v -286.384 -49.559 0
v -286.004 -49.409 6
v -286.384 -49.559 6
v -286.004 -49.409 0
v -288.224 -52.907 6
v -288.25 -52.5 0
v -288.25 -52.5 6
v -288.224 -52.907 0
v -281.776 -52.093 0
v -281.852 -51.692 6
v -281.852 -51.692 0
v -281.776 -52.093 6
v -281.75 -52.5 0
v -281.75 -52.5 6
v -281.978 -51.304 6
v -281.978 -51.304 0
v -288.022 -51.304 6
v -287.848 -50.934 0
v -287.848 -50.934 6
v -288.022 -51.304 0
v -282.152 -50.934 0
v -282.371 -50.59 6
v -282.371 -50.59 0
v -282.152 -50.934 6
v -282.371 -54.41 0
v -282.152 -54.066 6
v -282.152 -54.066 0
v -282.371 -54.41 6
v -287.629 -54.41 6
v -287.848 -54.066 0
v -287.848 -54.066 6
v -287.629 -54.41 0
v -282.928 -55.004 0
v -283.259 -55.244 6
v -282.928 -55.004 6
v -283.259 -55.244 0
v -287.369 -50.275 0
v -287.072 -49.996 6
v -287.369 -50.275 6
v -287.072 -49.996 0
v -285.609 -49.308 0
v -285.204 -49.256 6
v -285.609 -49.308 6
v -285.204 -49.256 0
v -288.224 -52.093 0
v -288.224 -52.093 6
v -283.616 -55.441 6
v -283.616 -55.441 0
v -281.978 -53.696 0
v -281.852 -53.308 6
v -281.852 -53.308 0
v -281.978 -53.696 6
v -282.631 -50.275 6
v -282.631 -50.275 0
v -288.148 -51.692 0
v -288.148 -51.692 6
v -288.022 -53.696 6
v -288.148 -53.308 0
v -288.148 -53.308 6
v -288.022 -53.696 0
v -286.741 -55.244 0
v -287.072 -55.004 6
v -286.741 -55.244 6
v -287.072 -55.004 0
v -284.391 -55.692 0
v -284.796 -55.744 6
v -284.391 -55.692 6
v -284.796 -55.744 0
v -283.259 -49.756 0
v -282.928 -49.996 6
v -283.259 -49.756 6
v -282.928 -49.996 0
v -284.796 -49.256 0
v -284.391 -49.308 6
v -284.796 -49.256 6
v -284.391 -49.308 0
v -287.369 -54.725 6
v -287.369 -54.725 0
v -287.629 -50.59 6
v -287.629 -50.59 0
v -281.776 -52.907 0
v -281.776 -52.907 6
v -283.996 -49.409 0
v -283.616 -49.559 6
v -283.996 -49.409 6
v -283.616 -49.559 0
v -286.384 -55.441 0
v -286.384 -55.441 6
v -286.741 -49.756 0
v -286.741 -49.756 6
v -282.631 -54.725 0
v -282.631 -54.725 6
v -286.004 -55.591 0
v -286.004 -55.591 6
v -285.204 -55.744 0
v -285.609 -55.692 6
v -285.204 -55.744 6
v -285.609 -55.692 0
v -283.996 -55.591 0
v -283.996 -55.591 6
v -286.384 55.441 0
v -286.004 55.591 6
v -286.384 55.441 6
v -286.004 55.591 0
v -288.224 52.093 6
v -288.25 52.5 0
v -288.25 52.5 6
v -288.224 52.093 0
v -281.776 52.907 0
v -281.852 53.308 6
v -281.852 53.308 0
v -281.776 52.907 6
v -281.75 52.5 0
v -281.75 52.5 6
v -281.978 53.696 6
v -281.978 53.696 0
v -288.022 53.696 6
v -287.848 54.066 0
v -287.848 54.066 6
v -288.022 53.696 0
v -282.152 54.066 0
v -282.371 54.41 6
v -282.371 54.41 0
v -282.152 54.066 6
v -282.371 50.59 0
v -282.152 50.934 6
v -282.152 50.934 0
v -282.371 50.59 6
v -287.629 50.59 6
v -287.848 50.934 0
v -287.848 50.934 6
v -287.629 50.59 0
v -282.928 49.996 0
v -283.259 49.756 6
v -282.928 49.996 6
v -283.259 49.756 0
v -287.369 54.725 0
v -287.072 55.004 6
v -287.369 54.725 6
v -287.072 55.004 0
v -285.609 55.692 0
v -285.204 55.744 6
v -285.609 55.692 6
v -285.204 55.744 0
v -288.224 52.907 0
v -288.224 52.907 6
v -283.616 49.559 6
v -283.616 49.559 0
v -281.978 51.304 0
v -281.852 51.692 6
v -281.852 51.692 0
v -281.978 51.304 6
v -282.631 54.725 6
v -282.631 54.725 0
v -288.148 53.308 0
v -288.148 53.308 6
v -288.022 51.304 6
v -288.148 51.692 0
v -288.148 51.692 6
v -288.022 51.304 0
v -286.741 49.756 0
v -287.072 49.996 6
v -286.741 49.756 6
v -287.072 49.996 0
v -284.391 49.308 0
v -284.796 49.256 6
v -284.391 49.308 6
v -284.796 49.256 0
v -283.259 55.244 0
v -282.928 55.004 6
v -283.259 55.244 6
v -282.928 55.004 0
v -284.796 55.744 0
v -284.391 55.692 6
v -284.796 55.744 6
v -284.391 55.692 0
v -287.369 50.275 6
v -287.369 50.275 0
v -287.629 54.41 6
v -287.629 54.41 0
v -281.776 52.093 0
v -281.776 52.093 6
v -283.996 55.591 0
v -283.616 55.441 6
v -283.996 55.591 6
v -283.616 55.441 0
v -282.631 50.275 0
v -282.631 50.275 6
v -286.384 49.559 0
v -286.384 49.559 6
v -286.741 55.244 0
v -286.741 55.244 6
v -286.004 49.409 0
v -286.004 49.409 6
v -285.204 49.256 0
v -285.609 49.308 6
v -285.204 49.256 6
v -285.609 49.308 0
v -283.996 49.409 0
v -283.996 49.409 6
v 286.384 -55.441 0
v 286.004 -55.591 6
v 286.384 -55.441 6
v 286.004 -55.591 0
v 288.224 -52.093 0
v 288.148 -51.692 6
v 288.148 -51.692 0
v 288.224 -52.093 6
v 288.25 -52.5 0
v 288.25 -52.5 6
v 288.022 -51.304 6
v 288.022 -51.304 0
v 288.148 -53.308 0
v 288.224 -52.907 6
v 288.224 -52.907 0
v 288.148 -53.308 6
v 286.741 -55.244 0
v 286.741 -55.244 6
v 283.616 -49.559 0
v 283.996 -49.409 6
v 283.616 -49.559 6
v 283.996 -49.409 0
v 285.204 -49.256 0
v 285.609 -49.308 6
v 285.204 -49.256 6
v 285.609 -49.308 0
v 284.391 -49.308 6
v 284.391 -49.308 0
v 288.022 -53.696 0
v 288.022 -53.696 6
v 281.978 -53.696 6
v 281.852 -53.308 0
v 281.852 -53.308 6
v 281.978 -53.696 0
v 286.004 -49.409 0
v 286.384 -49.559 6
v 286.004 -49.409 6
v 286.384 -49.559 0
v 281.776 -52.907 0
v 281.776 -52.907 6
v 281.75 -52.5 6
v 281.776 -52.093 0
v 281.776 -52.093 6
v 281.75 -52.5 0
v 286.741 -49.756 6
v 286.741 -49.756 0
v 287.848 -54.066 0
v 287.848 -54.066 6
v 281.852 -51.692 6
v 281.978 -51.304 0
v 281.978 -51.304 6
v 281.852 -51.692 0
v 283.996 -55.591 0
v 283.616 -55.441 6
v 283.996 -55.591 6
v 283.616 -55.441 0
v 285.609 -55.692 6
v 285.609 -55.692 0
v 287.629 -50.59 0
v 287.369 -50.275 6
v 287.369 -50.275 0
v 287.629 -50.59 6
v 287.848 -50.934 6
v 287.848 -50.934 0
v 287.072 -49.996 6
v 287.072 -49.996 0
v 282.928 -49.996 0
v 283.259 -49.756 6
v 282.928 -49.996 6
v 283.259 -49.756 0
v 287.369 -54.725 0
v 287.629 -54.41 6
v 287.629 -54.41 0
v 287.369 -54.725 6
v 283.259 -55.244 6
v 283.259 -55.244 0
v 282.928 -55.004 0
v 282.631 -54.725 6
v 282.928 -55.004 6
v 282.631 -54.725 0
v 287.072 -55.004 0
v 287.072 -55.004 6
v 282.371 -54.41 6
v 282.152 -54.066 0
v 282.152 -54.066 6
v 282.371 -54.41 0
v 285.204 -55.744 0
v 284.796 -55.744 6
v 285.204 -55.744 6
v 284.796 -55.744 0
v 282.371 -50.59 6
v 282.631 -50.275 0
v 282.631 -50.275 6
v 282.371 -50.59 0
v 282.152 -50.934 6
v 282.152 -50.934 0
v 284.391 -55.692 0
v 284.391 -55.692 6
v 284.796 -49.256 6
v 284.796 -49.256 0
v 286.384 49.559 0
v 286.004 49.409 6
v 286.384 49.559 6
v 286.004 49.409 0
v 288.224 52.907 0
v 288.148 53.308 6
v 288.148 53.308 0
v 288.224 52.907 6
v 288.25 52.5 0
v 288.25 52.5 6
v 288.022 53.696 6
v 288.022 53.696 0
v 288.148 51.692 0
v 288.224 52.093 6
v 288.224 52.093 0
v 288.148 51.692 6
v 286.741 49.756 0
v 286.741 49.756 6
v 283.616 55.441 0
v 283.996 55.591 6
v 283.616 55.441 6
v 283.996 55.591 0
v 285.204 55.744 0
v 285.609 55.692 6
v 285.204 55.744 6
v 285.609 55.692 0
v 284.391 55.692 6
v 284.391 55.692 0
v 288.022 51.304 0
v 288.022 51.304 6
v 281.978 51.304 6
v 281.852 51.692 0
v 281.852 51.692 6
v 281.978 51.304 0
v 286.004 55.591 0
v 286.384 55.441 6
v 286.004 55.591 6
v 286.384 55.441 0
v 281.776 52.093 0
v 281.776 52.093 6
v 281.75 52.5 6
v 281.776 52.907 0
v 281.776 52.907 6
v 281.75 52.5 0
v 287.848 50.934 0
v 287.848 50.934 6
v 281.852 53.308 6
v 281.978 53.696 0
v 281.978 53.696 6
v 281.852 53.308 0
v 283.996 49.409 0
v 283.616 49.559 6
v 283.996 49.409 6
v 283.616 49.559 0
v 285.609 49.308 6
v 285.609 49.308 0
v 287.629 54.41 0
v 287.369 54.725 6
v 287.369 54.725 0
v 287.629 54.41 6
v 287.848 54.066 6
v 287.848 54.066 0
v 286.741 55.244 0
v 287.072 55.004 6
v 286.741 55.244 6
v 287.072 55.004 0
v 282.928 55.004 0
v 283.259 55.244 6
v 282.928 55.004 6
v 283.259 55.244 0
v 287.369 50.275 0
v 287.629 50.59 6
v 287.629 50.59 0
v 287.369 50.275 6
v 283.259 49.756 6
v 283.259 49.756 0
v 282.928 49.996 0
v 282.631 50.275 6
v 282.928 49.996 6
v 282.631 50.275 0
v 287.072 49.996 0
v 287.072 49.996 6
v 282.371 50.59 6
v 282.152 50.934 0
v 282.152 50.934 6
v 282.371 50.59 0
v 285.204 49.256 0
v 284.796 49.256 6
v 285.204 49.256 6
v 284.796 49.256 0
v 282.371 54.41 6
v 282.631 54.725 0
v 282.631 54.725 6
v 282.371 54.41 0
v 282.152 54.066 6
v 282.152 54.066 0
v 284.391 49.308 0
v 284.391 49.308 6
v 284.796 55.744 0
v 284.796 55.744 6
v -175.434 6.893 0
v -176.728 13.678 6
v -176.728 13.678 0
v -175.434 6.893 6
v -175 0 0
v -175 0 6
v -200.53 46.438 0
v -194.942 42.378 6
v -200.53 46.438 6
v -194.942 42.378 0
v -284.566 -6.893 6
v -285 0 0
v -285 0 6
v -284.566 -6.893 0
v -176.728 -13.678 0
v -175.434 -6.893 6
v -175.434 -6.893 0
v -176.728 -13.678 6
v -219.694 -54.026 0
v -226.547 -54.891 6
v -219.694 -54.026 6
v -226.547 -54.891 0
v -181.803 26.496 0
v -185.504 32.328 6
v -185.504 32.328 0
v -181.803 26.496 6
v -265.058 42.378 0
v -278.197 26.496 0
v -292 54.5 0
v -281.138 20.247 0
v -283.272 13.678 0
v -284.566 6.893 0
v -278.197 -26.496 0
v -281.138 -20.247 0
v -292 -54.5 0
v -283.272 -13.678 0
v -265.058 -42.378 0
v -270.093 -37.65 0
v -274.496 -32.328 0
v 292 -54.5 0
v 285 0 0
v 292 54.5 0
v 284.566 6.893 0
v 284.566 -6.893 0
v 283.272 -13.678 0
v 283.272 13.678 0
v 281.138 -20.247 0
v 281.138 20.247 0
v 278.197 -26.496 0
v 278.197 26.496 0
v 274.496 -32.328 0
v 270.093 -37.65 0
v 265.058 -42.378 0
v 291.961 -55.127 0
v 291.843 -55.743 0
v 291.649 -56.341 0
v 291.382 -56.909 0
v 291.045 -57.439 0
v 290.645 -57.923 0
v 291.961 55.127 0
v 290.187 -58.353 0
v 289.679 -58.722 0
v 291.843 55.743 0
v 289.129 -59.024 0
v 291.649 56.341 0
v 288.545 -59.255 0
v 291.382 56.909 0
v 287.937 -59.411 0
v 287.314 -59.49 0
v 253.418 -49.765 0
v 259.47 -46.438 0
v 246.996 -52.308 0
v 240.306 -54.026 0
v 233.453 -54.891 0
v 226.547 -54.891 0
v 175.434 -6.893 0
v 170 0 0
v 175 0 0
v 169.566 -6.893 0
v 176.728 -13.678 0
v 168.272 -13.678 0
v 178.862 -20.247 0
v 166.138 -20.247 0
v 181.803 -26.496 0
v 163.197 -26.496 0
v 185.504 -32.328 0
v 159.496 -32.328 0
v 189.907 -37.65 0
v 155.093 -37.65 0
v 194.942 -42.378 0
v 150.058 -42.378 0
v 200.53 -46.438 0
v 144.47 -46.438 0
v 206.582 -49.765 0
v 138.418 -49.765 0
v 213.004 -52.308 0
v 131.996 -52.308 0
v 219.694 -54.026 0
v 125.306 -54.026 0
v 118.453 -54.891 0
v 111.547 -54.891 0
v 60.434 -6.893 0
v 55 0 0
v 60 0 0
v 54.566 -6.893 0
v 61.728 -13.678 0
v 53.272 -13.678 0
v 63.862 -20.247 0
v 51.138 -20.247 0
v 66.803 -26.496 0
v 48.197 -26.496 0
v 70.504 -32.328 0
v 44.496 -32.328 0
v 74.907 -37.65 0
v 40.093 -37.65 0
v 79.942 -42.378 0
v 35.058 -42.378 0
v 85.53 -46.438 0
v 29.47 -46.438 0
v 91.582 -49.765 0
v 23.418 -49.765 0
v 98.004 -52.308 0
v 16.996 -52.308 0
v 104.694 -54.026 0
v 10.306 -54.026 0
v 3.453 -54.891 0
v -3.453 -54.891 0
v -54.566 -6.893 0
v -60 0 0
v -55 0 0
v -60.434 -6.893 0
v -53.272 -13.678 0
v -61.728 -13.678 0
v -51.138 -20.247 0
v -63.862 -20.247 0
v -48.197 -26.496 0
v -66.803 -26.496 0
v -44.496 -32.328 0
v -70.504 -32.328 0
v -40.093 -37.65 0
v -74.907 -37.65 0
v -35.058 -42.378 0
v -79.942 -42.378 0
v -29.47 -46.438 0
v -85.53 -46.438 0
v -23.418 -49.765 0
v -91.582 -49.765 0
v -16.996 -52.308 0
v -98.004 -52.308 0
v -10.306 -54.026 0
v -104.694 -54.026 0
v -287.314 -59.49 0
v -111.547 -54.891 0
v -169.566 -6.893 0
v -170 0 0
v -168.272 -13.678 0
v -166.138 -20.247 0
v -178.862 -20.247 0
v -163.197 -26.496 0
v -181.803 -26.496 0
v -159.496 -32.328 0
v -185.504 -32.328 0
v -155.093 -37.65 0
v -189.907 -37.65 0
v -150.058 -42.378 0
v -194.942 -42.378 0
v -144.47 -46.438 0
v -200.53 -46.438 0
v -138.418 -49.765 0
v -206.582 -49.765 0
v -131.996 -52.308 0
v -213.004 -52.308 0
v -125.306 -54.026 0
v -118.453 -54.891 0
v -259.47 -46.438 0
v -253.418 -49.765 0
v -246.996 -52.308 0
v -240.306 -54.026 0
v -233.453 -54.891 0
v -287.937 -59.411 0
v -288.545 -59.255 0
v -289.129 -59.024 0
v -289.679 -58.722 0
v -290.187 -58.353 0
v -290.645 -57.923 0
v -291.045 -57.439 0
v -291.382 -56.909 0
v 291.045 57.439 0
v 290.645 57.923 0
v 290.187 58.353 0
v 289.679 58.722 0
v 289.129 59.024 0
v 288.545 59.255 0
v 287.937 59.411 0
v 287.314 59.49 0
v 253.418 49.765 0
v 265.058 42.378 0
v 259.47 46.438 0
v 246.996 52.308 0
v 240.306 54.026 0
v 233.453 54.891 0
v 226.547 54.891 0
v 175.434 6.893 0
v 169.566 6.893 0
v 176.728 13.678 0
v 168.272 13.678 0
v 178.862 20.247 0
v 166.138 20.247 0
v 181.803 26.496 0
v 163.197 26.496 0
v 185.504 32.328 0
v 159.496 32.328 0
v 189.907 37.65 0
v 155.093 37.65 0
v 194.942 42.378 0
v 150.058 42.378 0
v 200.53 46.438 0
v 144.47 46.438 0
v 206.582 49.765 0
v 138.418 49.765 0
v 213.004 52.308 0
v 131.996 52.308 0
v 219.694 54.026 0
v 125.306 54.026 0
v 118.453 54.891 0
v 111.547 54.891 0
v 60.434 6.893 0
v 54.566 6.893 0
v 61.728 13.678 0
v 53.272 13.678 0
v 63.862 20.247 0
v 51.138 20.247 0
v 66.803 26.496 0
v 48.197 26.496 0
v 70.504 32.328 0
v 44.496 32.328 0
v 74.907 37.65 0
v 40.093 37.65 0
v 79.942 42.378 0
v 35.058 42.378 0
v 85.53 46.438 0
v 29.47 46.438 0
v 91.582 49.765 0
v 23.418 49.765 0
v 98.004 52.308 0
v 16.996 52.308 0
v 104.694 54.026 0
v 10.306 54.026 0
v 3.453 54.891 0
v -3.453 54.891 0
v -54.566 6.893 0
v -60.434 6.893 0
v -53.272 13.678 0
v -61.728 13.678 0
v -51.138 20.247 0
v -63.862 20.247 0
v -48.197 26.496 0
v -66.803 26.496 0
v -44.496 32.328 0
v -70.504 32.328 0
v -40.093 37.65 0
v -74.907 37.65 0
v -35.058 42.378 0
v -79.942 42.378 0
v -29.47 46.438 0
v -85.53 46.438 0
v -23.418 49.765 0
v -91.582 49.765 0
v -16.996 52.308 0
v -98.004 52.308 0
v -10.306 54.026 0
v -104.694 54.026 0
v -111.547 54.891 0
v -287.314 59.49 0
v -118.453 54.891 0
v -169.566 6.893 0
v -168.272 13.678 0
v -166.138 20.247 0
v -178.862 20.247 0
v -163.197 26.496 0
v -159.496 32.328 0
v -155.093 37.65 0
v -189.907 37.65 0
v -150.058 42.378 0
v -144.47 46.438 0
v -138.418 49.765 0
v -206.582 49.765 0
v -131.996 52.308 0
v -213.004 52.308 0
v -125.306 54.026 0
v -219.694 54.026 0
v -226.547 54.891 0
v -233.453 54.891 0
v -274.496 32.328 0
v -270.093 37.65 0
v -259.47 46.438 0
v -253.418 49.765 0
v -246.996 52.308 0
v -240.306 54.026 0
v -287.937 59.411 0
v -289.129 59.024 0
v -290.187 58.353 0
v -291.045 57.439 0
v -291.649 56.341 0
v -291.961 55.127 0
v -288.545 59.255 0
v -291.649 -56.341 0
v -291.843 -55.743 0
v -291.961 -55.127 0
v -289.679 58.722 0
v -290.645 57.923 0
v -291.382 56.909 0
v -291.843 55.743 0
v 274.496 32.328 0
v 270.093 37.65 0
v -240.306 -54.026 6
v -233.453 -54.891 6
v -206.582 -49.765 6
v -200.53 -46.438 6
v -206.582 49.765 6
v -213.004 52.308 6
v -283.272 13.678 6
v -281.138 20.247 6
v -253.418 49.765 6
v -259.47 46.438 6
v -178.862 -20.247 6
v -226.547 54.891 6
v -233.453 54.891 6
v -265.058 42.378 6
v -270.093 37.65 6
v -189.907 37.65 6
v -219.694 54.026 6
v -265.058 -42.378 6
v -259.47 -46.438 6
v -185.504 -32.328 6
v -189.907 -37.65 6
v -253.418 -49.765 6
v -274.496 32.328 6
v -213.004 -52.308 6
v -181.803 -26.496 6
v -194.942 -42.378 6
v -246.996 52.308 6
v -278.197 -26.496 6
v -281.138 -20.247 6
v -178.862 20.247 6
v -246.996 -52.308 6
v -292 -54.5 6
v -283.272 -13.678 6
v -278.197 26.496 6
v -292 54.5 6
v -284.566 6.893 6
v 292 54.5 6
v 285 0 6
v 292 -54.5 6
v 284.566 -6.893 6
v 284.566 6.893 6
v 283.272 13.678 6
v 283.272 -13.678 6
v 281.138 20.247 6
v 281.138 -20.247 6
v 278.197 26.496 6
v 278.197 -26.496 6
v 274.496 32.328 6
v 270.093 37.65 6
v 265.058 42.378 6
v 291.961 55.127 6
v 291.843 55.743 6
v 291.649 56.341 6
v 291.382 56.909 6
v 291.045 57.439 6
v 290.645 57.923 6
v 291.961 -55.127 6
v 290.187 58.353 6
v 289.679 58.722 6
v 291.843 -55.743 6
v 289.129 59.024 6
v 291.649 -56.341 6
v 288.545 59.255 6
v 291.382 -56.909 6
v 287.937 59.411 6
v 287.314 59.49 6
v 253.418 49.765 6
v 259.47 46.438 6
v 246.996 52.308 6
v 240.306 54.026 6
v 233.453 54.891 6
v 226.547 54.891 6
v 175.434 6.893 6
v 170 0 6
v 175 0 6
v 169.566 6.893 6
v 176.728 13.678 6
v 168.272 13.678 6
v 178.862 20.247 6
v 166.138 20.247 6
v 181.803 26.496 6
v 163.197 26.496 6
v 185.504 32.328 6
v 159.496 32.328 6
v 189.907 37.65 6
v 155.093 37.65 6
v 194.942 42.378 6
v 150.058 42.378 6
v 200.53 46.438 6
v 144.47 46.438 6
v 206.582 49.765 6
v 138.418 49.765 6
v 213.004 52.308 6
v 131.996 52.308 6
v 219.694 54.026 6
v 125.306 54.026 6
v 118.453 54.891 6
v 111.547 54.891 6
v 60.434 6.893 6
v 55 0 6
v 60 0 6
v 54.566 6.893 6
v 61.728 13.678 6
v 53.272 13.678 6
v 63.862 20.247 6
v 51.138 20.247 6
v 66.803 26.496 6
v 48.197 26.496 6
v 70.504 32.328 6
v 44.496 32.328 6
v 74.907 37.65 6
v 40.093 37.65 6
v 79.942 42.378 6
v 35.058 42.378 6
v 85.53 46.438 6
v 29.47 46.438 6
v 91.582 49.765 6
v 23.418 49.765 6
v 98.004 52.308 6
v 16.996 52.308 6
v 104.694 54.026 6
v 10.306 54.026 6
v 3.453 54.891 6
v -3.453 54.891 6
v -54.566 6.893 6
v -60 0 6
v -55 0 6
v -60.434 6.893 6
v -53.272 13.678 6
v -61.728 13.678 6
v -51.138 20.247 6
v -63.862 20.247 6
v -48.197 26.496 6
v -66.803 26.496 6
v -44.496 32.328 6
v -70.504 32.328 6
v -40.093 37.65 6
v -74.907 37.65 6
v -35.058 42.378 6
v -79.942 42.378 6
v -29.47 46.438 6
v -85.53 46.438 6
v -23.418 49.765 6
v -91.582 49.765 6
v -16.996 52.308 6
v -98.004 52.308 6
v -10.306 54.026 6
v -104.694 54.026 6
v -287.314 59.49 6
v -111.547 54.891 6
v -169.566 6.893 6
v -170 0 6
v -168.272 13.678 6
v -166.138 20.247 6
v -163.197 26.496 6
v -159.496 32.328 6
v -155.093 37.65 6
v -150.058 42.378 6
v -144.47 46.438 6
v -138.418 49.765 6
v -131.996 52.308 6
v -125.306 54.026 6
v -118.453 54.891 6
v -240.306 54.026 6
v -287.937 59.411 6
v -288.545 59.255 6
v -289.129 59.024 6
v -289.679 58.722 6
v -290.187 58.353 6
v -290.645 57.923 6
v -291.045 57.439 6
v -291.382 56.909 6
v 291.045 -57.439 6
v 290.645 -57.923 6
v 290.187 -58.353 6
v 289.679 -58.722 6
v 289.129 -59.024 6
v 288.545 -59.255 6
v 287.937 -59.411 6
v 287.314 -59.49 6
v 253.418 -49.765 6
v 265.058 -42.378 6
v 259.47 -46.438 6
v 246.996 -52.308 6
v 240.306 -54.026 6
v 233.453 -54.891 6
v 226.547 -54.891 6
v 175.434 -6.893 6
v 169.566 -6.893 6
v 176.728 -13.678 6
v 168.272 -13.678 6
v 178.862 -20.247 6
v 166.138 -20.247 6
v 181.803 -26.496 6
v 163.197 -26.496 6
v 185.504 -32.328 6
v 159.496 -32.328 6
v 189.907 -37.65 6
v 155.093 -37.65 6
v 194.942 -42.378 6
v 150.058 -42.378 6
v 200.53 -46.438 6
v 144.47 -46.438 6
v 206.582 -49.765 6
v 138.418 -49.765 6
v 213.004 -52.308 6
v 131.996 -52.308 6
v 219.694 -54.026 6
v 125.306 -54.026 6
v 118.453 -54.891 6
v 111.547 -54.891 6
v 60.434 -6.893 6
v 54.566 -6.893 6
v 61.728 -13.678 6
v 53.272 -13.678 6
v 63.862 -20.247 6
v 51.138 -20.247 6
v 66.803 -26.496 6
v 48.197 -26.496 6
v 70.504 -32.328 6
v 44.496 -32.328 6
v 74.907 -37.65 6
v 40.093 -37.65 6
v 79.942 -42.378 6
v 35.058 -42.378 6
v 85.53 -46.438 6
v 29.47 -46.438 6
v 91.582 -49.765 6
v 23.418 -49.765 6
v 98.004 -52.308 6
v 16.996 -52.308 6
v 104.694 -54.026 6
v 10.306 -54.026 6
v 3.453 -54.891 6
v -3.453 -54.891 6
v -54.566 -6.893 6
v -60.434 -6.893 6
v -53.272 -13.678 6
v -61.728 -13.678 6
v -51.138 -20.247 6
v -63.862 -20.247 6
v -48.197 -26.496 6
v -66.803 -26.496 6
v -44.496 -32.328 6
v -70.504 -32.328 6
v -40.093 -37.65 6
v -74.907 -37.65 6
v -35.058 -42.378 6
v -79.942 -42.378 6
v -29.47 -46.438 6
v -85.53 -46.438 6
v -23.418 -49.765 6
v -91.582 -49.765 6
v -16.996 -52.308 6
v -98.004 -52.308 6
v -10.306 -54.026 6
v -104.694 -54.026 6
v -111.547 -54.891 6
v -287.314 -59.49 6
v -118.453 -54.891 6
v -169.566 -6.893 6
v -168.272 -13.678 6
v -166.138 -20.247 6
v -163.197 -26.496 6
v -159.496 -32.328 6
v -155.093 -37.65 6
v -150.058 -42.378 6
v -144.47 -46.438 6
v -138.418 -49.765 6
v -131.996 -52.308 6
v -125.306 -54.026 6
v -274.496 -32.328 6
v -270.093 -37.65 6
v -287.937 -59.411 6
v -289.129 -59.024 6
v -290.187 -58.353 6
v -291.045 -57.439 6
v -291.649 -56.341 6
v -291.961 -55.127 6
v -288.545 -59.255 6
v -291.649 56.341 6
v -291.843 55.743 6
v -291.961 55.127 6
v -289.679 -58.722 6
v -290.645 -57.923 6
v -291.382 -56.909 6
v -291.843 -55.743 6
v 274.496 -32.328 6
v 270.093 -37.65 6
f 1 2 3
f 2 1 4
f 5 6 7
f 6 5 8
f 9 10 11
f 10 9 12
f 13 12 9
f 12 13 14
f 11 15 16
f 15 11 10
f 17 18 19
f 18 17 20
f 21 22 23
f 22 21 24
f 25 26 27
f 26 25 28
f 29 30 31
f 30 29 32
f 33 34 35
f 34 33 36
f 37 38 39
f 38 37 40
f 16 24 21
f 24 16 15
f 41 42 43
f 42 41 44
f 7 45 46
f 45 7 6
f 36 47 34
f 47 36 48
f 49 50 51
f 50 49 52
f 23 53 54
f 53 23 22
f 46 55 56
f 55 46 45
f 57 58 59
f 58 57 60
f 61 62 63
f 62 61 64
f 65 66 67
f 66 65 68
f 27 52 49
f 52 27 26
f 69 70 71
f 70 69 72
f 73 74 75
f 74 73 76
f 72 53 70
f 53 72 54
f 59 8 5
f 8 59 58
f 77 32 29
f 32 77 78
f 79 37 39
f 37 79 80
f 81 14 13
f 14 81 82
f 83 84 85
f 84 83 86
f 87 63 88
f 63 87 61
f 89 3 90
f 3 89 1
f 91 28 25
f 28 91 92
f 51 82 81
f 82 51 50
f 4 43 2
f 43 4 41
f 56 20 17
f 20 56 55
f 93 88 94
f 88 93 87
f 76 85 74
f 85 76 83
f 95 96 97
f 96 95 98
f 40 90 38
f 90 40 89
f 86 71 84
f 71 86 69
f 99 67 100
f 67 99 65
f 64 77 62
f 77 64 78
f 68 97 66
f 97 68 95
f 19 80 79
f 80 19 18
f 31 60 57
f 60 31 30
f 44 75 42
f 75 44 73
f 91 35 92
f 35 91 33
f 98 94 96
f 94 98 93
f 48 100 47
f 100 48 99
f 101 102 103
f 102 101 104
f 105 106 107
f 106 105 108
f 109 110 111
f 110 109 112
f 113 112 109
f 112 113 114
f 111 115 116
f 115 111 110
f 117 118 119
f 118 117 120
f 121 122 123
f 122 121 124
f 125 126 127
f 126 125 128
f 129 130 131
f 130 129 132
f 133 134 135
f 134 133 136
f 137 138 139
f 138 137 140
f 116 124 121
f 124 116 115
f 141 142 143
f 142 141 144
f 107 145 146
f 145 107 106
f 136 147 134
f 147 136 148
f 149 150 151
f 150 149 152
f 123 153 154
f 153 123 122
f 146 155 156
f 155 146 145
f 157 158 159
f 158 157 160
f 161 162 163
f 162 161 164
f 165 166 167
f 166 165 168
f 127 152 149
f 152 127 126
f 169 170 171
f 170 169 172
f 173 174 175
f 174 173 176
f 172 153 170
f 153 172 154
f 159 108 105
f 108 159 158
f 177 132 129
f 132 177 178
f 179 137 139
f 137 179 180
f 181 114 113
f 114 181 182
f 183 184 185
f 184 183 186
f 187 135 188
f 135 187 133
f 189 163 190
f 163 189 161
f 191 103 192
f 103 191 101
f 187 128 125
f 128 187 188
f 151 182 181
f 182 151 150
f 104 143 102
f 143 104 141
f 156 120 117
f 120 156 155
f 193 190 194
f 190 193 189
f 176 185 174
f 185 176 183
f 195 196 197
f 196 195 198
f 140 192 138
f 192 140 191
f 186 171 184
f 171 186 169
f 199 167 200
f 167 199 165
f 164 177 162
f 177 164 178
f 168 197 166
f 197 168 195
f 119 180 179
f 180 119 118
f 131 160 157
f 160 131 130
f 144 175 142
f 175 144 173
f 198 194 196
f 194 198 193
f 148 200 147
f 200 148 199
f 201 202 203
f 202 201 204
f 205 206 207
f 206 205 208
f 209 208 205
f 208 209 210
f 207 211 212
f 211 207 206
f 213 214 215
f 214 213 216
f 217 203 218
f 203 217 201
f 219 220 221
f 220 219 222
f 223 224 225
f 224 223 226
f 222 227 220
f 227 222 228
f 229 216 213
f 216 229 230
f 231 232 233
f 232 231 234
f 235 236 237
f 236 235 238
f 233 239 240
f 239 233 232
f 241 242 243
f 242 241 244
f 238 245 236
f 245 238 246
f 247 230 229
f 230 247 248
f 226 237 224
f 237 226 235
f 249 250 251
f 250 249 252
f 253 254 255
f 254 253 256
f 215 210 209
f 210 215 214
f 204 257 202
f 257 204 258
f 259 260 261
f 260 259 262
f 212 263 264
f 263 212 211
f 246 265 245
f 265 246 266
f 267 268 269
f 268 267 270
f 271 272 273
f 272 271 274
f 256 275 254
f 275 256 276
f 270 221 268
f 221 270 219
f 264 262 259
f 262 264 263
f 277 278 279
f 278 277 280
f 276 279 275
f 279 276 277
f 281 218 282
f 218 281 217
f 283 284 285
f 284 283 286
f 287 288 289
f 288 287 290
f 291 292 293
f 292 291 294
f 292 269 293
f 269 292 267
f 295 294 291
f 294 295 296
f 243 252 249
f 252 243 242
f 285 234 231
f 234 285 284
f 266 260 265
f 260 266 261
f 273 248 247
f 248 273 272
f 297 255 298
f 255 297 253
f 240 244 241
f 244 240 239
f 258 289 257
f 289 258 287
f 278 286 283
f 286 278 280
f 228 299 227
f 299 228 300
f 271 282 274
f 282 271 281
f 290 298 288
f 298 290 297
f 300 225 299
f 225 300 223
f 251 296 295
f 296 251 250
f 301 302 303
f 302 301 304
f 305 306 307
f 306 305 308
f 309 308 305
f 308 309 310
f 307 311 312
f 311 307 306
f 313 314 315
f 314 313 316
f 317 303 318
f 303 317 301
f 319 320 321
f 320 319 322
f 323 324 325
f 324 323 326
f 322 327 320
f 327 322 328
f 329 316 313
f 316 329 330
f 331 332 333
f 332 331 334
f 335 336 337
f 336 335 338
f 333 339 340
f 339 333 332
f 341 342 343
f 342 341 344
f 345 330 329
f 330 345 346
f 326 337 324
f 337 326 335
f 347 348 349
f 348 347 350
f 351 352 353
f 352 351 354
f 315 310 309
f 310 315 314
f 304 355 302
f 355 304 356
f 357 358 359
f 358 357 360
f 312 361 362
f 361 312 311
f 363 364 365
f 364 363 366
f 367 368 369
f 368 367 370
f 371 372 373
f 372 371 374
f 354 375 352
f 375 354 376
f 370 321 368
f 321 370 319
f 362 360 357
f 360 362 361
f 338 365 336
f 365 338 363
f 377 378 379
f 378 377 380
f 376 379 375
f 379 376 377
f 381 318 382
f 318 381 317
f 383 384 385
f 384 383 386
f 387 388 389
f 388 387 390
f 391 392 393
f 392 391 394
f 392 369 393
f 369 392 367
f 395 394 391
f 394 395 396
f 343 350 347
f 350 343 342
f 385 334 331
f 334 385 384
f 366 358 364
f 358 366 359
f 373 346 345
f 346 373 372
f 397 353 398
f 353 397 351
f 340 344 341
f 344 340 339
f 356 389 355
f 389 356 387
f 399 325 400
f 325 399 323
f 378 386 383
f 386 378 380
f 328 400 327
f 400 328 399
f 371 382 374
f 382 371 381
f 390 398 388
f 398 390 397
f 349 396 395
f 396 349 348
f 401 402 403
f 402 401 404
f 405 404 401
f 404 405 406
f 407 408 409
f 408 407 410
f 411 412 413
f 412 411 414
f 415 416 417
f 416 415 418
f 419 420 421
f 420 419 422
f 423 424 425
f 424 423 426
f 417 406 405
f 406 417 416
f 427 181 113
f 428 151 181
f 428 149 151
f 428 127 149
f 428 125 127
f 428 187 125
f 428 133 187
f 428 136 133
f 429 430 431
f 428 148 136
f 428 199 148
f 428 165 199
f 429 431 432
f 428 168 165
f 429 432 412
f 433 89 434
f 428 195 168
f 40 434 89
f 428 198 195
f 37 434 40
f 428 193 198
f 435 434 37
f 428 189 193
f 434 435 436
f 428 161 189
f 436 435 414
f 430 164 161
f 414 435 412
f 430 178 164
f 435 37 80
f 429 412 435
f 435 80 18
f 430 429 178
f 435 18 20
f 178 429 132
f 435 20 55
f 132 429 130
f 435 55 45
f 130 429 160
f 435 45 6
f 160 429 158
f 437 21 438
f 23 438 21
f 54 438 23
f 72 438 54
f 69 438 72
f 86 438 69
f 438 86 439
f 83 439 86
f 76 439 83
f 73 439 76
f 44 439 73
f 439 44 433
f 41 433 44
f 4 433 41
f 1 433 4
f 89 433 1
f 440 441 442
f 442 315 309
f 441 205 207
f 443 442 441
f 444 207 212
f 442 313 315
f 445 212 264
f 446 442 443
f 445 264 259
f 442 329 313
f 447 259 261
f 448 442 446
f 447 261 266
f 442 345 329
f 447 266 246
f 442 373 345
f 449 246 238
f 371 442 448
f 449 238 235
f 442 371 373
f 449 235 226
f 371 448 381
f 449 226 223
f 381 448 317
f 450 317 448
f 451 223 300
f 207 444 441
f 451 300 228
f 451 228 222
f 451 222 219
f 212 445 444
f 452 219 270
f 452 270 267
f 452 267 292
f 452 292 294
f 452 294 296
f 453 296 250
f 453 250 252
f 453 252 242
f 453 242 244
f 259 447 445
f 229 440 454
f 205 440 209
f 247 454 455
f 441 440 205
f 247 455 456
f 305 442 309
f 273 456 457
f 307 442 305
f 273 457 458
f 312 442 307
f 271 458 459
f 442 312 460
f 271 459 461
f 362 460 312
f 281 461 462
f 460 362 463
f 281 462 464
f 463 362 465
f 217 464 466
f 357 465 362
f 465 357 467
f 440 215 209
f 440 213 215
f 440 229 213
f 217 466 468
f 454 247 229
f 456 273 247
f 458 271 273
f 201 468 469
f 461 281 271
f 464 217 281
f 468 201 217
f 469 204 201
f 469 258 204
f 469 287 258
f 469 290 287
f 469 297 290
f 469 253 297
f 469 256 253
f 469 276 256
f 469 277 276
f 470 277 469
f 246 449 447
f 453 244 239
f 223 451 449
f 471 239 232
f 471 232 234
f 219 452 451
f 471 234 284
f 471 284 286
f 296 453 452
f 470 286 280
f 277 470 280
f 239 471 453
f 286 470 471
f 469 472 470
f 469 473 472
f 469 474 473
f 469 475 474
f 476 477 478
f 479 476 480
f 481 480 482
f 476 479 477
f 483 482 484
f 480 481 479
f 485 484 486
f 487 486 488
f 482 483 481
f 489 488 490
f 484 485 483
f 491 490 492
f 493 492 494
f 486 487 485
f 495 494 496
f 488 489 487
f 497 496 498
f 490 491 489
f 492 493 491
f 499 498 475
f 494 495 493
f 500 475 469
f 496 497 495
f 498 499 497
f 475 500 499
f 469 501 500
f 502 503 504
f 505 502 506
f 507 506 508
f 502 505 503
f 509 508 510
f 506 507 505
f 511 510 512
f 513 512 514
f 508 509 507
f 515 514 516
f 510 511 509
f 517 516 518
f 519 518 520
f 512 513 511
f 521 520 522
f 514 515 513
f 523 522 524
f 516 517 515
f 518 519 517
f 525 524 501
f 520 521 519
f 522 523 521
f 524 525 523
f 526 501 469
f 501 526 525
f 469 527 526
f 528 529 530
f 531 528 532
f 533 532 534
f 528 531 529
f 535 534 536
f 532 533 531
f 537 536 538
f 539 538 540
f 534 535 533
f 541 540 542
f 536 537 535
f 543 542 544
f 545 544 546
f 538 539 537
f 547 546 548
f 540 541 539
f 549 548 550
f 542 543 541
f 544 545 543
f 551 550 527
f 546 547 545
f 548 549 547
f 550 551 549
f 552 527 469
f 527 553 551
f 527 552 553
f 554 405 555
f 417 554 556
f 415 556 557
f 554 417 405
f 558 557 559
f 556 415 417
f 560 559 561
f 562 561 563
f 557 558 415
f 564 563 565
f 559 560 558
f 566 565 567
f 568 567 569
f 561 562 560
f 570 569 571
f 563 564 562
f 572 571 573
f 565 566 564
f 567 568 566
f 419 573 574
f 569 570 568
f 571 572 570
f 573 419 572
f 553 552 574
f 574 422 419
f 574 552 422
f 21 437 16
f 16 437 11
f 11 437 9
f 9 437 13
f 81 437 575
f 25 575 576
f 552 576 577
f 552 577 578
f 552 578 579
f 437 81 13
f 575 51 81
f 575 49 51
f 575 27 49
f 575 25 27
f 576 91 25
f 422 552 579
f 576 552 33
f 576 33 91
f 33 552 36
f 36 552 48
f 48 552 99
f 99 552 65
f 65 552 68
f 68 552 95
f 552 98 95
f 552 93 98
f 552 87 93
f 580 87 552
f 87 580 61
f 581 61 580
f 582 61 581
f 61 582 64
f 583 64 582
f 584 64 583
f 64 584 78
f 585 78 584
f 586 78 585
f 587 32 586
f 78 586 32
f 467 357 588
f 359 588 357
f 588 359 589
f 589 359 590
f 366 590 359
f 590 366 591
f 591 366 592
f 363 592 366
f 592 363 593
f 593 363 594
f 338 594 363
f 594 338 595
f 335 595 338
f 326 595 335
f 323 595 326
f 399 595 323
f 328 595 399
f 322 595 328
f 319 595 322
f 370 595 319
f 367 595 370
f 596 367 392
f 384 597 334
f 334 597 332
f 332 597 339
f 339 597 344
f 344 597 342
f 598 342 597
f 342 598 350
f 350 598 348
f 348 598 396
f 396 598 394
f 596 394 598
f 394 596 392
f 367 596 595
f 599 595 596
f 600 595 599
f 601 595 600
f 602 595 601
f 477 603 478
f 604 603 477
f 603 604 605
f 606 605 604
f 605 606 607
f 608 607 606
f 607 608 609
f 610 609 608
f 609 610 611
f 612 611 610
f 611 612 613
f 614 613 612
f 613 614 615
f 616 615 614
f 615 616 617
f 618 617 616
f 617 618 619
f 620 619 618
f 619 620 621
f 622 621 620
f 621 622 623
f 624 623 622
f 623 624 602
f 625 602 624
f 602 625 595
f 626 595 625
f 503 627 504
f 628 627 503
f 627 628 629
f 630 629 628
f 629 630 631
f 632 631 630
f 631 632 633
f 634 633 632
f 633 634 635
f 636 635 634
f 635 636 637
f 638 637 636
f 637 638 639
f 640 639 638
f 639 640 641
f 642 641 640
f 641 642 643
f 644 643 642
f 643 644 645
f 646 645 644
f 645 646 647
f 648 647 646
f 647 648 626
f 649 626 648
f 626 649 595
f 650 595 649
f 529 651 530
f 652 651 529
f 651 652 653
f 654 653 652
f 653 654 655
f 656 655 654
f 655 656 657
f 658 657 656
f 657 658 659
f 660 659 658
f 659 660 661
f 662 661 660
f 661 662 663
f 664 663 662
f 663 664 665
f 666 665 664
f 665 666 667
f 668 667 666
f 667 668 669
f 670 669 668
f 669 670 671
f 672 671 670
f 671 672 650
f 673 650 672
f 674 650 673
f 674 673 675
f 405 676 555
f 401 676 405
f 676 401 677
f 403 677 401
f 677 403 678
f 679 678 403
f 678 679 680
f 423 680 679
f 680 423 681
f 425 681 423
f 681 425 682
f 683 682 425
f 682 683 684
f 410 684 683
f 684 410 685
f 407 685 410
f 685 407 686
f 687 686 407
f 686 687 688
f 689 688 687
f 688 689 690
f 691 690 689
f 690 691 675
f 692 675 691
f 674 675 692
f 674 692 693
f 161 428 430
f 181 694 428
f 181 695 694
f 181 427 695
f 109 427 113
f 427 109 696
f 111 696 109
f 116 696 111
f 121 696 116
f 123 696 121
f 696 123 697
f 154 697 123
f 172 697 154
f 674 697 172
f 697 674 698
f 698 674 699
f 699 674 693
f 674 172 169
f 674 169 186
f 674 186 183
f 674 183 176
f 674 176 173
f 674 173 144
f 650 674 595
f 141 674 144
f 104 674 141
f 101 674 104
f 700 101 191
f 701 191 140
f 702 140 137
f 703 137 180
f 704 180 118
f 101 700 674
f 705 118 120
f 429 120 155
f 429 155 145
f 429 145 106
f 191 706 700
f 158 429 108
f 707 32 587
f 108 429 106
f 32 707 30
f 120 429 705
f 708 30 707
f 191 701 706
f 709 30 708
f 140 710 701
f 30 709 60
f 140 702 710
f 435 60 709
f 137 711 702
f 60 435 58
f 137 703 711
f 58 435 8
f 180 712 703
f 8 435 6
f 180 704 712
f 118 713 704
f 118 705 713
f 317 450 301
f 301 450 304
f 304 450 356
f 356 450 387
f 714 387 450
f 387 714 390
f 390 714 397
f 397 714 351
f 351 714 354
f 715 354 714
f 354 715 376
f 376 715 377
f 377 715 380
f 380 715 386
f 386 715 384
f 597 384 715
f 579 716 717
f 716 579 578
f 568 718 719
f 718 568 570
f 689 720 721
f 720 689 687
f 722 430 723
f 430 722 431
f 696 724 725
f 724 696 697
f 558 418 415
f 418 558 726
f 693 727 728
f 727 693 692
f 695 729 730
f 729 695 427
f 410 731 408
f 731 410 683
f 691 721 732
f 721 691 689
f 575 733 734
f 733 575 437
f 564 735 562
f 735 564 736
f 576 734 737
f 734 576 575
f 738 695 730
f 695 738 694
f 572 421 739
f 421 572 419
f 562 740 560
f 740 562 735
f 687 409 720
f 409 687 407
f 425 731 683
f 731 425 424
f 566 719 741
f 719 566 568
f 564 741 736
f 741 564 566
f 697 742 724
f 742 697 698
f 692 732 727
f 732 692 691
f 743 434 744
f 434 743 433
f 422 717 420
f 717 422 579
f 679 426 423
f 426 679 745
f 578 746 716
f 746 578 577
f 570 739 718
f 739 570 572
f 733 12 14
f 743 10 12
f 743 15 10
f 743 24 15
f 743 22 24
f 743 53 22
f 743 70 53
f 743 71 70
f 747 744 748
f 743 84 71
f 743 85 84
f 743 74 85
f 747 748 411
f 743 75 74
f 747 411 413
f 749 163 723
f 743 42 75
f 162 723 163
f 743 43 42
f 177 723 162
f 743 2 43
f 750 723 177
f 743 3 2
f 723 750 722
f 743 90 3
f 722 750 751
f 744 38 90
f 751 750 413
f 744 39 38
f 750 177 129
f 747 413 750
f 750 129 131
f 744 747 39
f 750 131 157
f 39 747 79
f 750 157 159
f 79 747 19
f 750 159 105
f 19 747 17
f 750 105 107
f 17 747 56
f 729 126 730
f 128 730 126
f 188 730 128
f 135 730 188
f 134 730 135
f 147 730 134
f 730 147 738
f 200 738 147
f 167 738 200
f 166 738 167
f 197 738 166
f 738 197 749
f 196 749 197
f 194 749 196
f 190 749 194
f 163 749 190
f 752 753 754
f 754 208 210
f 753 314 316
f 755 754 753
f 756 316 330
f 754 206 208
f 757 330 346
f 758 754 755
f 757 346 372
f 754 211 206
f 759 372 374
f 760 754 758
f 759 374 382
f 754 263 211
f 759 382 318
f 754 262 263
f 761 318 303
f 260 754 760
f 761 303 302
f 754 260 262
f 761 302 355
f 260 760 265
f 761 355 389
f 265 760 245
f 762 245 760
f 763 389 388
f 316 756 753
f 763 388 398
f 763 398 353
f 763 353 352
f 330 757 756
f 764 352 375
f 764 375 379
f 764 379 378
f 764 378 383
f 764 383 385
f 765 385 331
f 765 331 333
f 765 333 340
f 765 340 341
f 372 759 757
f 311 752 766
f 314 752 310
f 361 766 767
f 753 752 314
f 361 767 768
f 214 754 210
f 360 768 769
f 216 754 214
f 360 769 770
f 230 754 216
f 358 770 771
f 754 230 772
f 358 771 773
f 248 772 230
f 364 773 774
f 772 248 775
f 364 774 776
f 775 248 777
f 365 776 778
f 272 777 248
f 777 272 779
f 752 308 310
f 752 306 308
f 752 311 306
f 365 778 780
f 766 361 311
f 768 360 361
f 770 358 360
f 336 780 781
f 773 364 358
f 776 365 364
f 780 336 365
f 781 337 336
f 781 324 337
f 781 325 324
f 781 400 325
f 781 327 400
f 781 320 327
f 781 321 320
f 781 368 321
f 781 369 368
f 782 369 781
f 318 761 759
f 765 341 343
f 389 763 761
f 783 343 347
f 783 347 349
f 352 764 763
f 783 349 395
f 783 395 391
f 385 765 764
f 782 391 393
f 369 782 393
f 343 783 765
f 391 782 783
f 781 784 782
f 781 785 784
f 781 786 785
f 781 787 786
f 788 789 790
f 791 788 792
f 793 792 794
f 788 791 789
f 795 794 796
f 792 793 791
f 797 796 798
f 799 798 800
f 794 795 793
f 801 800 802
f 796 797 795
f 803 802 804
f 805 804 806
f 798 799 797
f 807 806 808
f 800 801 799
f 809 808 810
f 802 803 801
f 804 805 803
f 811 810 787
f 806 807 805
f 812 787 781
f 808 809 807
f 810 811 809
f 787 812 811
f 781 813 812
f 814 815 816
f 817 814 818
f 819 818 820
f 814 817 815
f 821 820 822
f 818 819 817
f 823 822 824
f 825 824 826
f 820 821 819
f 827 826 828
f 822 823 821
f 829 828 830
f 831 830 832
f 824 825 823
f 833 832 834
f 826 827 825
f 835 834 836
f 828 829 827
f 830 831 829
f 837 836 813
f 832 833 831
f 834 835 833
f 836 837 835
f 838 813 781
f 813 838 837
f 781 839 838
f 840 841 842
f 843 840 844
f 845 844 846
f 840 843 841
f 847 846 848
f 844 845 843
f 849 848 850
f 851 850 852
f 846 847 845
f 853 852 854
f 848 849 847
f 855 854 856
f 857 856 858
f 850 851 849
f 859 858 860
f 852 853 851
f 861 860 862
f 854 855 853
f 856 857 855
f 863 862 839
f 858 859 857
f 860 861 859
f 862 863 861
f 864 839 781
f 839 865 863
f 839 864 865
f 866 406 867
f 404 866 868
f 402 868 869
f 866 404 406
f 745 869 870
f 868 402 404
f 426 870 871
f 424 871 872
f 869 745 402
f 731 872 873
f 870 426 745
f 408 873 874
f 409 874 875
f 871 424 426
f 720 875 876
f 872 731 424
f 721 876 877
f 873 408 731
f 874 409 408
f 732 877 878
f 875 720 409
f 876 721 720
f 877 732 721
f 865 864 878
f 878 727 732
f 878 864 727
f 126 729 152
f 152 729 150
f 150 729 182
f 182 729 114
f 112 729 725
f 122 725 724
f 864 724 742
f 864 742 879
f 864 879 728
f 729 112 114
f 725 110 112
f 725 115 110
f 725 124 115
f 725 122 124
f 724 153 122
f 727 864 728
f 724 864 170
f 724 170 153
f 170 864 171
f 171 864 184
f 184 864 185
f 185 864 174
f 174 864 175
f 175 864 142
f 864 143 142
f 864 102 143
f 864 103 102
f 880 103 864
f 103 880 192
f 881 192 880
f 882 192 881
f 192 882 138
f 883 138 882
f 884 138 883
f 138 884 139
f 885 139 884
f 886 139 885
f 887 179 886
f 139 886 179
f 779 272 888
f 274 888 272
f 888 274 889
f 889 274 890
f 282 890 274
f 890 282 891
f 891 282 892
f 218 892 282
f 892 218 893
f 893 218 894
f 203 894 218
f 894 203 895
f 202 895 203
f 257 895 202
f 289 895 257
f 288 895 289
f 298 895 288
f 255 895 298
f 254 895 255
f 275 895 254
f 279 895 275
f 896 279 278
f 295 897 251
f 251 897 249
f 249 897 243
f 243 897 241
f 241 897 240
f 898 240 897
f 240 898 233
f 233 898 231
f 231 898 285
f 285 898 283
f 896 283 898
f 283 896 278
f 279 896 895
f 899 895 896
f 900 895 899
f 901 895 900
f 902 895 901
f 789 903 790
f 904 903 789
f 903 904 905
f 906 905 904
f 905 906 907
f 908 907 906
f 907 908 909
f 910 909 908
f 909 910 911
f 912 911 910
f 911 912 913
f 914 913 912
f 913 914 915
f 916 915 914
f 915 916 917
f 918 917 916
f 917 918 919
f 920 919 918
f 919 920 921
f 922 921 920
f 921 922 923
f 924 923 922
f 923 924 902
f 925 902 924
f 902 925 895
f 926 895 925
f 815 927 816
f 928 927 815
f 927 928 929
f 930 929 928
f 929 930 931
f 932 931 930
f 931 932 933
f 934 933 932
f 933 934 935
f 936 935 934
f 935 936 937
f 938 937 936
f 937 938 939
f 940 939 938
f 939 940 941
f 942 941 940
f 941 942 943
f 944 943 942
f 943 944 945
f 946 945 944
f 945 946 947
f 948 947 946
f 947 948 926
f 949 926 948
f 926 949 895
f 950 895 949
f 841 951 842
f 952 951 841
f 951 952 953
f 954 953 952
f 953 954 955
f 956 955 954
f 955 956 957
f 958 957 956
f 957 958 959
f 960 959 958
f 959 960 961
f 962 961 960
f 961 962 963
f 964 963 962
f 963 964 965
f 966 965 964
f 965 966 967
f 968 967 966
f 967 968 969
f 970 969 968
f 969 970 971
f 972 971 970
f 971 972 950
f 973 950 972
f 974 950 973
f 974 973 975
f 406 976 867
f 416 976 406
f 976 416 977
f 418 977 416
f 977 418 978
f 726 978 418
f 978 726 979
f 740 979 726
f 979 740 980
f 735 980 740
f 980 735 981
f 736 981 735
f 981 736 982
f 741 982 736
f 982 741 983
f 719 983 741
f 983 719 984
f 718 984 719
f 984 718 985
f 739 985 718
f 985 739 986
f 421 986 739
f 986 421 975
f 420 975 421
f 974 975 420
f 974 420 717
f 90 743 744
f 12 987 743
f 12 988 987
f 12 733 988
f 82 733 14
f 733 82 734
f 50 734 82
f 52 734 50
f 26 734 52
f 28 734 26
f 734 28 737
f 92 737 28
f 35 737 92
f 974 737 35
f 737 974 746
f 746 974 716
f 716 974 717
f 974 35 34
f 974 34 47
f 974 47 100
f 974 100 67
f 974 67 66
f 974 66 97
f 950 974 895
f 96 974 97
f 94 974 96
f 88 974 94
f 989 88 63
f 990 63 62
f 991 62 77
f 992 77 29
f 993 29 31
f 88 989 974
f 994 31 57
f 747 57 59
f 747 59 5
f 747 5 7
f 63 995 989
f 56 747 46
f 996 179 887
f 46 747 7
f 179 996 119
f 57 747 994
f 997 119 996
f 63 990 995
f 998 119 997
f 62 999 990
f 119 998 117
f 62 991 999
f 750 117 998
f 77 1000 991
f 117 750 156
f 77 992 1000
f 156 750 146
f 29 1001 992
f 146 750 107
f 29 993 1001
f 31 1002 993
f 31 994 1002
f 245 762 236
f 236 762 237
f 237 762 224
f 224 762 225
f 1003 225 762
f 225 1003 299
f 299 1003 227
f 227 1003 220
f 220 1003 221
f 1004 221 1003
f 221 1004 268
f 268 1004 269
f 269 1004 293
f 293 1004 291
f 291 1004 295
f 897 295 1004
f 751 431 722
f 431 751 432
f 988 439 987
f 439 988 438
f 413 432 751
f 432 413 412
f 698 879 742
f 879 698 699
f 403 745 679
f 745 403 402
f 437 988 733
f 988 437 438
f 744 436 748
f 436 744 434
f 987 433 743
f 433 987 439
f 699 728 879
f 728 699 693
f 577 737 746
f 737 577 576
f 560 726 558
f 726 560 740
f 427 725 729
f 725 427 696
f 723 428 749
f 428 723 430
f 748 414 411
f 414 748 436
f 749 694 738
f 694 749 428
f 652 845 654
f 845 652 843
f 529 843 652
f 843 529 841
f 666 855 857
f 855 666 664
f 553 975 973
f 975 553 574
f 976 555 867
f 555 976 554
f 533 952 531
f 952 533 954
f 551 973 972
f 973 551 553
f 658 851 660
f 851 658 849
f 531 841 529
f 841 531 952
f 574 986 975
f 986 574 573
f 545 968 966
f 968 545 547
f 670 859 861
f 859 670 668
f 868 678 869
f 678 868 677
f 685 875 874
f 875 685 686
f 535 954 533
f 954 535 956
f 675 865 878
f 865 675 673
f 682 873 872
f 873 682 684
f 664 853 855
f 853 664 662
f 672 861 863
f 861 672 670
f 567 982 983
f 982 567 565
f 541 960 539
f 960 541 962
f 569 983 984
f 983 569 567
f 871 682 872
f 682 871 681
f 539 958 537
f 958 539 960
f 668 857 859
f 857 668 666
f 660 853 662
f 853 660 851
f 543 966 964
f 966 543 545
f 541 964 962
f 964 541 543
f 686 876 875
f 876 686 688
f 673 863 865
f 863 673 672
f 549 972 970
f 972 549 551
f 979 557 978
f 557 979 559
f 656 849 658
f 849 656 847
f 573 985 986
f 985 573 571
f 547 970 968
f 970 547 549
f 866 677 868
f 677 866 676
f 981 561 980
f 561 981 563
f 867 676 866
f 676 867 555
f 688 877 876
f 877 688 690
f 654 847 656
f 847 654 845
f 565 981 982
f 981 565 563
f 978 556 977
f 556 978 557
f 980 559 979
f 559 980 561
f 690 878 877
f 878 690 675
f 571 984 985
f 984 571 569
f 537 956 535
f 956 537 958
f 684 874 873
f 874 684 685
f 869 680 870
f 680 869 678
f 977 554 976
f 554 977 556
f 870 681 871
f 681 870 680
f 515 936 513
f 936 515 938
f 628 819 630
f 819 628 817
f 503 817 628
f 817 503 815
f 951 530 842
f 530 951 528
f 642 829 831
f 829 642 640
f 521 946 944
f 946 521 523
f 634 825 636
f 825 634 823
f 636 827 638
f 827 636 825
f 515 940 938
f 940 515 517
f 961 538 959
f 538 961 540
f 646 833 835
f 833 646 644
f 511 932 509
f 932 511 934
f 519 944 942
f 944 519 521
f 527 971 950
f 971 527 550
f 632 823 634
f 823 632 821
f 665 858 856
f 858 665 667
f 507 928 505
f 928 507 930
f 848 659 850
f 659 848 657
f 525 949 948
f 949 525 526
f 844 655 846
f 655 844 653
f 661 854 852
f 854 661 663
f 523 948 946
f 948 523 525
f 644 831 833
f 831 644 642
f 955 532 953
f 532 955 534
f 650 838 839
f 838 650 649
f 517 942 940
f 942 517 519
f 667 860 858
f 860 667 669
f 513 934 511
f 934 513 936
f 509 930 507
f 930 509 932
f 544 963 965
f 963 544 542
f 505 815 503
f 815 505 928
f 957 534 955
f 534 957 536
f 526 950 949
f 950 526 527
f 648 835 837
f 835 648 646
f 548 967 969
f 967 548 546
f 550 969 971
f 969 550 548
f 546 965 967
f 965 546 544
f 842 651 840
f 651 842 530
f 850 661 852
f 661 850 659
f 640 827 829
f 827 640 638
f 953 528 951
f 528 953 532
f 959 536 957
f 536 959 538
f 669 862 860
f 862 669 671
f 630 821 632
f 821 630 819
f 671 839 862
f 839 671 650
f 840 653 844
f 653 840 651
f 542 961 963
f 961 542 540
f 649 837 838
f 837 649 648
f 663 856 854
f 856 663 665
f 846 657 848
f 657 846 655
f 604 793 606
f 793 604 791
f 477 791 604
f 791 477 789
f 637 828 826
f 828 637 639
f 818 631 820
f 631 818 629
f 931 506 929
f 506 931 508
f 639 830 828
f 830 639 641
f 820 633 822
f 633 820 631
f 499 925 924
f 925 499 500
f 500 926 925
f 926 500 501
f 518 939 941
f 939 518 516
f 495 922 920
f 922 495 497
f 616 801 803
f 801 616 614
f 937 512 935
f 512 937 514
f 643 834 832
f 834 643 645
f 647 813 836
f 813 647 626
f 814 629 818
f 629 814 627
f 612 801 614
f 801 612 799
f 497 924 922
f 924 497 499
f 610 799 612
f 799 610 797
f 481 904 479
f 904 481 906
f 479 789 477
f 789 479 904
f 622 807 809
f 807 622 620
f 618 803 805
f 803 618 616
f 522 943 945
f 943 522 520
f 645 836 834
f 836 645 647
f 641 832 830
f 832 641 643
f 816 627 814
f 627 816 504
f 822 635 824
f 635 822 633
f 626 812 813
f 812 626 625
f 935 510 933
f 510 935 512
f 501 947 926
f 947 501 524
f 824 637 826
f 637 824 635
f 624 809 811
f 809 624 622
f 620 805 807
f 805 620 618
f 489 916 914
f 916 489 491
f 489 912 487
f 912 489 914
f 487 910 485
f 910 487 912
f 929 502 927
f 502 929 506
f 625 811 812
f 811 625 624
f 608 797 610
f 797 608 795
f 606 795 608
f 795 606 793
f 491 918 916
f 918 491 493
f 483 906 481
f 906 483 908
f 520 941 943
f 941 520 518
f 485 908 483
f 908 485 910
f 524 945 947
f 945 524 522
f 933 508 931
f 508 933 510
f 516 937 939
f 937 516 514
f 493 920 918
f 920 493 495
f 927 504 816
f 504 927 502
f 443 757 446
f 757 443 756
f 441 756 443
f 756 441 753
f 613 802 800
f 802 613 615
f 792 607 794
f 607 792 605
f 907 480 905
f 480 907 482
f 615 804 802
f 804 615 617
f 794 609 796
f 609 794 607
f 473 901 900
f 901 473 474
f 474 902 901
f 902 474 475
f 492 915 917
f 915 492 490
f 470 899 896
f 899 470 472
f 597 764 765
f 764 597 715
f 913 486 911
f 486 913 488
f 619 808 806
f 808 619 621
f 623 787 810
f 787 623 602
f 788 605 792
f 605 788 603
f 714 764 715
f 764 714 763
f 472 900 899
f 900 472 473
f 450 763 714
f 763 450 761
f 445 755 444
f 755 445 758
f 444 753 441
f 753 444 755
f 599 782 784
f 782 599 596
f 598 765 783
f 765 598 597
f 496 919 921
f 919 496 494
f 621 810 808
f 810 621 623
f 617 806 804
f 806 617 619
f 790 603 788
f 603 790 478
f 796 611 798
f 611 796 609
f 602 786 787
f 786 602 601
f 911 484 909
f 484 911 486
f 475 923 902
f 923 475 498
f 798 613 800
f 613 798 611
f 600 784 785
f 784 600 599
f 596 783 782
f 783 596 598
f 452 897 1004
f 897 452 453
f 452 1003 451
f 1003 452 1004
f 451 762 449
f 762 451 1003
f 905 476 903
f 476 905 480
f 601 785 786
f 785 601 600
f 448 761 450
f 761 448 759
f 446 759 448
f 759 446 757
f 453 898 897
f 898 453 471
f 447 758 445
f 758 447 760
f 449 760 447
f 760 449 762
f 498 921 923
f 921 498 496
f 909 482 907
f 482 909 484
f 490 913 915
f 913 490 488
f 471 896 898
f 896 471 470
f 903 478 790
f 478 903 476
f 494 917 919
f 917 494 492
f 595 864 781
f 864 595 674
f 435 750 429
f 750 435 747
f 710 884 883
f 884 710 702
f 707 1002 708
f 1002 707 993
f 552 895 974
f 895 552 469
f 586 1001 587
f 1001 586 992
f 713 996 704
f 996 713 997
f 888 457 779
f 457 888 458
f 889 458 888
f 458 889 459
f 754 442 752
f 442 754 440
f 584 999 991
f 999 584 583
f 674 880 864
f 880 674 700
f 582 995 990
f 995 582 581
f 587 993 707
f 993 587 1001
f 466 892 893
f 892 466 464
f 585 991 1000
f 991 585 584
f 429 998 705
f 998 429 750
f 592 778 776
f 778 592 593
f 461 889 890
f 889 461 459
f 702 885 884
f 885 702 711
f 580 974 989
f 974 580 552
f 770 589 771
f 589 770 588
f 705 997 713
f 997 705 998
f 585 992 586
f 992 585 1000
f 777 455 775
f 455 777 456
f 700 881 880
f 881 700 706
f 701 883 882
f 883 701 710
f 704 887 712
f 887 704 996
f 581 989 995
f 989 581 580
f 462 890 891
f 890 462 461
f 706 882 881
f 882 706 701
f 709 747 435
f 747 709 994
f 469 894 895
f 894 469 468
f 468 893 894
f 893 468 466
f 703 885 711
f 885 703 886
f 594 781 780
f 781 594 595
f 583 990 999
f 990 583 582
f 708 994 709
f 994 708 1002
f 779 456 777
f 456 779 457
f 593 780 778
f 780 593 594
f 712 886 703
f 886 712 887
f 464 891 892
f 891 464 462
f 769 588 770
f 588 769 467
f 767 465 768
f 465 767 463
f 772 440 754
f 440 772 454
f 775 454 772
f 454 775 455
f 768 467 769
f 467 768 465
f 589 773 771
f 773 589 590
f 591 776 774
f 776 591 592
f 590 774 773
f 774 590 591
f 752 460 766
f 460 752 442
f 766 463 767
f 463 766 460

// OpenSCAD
$fn = 50;


difference() {
	union() {
		hull() {
			translate(v = [-287.0000000000, 54.5000000000, 0]) {
				cylinder(h = 6, r = 5);
			}
			translate(v = [287.0000000000, 54.5000000000, 0]) {
				cylinder(h = 6, r = 5);
			}
			translate(v = [-287.0000000000, -54.5000000000, 0]) {
				cylinder(h = 6, r = 5);
			}
			translate(v = [287.0000000000, -54.5000000000, 0]) {
				cylinder(h = 6, r = 5);
			}
		}
	}
	union() {
		#translate(v = [-285.0000000000, -52.5000000000, -100.0000000000]) {
			cylinder(h = 200, r = 3.2500000000);
		}
		#translate(v = [-285.0000000000, 52.5000000000, -100.0000000000]) {
			cylinder(h = 200, r = 3.2500000000);
		}
		#translate(v = [285.0000000000, -52.5000000000, -100.0000000000]) {
			cylinder(h = 200, r = 3.2500000000);
		}
		#translate(v = [285.0000000000, 52.5000000000, -100.0000000000]) {
			cylinder(h = 200, r = 3.2500000000);
		}
		#translate(v = [-230.0000000000, 0, 0]) {
			cylinder(h = 6, r = 55.0000000000);
		}
		#translate(v = [-115.0000000000, 0, 0]) {
			cylinder(h = 6, r = 55.0000000000);
		}
		#cylinder(h = 6, r = 55.0000000000);
		#translate(v = [115.0000000000, 0, 0]) {
			cylinder(h = 6, r = 55.0000000000);
		}
		#translate(v = [230.0000000000, 0, 0]) {
			cylinder(h = 6, r = 55.0000000000);
		}
	}
}
